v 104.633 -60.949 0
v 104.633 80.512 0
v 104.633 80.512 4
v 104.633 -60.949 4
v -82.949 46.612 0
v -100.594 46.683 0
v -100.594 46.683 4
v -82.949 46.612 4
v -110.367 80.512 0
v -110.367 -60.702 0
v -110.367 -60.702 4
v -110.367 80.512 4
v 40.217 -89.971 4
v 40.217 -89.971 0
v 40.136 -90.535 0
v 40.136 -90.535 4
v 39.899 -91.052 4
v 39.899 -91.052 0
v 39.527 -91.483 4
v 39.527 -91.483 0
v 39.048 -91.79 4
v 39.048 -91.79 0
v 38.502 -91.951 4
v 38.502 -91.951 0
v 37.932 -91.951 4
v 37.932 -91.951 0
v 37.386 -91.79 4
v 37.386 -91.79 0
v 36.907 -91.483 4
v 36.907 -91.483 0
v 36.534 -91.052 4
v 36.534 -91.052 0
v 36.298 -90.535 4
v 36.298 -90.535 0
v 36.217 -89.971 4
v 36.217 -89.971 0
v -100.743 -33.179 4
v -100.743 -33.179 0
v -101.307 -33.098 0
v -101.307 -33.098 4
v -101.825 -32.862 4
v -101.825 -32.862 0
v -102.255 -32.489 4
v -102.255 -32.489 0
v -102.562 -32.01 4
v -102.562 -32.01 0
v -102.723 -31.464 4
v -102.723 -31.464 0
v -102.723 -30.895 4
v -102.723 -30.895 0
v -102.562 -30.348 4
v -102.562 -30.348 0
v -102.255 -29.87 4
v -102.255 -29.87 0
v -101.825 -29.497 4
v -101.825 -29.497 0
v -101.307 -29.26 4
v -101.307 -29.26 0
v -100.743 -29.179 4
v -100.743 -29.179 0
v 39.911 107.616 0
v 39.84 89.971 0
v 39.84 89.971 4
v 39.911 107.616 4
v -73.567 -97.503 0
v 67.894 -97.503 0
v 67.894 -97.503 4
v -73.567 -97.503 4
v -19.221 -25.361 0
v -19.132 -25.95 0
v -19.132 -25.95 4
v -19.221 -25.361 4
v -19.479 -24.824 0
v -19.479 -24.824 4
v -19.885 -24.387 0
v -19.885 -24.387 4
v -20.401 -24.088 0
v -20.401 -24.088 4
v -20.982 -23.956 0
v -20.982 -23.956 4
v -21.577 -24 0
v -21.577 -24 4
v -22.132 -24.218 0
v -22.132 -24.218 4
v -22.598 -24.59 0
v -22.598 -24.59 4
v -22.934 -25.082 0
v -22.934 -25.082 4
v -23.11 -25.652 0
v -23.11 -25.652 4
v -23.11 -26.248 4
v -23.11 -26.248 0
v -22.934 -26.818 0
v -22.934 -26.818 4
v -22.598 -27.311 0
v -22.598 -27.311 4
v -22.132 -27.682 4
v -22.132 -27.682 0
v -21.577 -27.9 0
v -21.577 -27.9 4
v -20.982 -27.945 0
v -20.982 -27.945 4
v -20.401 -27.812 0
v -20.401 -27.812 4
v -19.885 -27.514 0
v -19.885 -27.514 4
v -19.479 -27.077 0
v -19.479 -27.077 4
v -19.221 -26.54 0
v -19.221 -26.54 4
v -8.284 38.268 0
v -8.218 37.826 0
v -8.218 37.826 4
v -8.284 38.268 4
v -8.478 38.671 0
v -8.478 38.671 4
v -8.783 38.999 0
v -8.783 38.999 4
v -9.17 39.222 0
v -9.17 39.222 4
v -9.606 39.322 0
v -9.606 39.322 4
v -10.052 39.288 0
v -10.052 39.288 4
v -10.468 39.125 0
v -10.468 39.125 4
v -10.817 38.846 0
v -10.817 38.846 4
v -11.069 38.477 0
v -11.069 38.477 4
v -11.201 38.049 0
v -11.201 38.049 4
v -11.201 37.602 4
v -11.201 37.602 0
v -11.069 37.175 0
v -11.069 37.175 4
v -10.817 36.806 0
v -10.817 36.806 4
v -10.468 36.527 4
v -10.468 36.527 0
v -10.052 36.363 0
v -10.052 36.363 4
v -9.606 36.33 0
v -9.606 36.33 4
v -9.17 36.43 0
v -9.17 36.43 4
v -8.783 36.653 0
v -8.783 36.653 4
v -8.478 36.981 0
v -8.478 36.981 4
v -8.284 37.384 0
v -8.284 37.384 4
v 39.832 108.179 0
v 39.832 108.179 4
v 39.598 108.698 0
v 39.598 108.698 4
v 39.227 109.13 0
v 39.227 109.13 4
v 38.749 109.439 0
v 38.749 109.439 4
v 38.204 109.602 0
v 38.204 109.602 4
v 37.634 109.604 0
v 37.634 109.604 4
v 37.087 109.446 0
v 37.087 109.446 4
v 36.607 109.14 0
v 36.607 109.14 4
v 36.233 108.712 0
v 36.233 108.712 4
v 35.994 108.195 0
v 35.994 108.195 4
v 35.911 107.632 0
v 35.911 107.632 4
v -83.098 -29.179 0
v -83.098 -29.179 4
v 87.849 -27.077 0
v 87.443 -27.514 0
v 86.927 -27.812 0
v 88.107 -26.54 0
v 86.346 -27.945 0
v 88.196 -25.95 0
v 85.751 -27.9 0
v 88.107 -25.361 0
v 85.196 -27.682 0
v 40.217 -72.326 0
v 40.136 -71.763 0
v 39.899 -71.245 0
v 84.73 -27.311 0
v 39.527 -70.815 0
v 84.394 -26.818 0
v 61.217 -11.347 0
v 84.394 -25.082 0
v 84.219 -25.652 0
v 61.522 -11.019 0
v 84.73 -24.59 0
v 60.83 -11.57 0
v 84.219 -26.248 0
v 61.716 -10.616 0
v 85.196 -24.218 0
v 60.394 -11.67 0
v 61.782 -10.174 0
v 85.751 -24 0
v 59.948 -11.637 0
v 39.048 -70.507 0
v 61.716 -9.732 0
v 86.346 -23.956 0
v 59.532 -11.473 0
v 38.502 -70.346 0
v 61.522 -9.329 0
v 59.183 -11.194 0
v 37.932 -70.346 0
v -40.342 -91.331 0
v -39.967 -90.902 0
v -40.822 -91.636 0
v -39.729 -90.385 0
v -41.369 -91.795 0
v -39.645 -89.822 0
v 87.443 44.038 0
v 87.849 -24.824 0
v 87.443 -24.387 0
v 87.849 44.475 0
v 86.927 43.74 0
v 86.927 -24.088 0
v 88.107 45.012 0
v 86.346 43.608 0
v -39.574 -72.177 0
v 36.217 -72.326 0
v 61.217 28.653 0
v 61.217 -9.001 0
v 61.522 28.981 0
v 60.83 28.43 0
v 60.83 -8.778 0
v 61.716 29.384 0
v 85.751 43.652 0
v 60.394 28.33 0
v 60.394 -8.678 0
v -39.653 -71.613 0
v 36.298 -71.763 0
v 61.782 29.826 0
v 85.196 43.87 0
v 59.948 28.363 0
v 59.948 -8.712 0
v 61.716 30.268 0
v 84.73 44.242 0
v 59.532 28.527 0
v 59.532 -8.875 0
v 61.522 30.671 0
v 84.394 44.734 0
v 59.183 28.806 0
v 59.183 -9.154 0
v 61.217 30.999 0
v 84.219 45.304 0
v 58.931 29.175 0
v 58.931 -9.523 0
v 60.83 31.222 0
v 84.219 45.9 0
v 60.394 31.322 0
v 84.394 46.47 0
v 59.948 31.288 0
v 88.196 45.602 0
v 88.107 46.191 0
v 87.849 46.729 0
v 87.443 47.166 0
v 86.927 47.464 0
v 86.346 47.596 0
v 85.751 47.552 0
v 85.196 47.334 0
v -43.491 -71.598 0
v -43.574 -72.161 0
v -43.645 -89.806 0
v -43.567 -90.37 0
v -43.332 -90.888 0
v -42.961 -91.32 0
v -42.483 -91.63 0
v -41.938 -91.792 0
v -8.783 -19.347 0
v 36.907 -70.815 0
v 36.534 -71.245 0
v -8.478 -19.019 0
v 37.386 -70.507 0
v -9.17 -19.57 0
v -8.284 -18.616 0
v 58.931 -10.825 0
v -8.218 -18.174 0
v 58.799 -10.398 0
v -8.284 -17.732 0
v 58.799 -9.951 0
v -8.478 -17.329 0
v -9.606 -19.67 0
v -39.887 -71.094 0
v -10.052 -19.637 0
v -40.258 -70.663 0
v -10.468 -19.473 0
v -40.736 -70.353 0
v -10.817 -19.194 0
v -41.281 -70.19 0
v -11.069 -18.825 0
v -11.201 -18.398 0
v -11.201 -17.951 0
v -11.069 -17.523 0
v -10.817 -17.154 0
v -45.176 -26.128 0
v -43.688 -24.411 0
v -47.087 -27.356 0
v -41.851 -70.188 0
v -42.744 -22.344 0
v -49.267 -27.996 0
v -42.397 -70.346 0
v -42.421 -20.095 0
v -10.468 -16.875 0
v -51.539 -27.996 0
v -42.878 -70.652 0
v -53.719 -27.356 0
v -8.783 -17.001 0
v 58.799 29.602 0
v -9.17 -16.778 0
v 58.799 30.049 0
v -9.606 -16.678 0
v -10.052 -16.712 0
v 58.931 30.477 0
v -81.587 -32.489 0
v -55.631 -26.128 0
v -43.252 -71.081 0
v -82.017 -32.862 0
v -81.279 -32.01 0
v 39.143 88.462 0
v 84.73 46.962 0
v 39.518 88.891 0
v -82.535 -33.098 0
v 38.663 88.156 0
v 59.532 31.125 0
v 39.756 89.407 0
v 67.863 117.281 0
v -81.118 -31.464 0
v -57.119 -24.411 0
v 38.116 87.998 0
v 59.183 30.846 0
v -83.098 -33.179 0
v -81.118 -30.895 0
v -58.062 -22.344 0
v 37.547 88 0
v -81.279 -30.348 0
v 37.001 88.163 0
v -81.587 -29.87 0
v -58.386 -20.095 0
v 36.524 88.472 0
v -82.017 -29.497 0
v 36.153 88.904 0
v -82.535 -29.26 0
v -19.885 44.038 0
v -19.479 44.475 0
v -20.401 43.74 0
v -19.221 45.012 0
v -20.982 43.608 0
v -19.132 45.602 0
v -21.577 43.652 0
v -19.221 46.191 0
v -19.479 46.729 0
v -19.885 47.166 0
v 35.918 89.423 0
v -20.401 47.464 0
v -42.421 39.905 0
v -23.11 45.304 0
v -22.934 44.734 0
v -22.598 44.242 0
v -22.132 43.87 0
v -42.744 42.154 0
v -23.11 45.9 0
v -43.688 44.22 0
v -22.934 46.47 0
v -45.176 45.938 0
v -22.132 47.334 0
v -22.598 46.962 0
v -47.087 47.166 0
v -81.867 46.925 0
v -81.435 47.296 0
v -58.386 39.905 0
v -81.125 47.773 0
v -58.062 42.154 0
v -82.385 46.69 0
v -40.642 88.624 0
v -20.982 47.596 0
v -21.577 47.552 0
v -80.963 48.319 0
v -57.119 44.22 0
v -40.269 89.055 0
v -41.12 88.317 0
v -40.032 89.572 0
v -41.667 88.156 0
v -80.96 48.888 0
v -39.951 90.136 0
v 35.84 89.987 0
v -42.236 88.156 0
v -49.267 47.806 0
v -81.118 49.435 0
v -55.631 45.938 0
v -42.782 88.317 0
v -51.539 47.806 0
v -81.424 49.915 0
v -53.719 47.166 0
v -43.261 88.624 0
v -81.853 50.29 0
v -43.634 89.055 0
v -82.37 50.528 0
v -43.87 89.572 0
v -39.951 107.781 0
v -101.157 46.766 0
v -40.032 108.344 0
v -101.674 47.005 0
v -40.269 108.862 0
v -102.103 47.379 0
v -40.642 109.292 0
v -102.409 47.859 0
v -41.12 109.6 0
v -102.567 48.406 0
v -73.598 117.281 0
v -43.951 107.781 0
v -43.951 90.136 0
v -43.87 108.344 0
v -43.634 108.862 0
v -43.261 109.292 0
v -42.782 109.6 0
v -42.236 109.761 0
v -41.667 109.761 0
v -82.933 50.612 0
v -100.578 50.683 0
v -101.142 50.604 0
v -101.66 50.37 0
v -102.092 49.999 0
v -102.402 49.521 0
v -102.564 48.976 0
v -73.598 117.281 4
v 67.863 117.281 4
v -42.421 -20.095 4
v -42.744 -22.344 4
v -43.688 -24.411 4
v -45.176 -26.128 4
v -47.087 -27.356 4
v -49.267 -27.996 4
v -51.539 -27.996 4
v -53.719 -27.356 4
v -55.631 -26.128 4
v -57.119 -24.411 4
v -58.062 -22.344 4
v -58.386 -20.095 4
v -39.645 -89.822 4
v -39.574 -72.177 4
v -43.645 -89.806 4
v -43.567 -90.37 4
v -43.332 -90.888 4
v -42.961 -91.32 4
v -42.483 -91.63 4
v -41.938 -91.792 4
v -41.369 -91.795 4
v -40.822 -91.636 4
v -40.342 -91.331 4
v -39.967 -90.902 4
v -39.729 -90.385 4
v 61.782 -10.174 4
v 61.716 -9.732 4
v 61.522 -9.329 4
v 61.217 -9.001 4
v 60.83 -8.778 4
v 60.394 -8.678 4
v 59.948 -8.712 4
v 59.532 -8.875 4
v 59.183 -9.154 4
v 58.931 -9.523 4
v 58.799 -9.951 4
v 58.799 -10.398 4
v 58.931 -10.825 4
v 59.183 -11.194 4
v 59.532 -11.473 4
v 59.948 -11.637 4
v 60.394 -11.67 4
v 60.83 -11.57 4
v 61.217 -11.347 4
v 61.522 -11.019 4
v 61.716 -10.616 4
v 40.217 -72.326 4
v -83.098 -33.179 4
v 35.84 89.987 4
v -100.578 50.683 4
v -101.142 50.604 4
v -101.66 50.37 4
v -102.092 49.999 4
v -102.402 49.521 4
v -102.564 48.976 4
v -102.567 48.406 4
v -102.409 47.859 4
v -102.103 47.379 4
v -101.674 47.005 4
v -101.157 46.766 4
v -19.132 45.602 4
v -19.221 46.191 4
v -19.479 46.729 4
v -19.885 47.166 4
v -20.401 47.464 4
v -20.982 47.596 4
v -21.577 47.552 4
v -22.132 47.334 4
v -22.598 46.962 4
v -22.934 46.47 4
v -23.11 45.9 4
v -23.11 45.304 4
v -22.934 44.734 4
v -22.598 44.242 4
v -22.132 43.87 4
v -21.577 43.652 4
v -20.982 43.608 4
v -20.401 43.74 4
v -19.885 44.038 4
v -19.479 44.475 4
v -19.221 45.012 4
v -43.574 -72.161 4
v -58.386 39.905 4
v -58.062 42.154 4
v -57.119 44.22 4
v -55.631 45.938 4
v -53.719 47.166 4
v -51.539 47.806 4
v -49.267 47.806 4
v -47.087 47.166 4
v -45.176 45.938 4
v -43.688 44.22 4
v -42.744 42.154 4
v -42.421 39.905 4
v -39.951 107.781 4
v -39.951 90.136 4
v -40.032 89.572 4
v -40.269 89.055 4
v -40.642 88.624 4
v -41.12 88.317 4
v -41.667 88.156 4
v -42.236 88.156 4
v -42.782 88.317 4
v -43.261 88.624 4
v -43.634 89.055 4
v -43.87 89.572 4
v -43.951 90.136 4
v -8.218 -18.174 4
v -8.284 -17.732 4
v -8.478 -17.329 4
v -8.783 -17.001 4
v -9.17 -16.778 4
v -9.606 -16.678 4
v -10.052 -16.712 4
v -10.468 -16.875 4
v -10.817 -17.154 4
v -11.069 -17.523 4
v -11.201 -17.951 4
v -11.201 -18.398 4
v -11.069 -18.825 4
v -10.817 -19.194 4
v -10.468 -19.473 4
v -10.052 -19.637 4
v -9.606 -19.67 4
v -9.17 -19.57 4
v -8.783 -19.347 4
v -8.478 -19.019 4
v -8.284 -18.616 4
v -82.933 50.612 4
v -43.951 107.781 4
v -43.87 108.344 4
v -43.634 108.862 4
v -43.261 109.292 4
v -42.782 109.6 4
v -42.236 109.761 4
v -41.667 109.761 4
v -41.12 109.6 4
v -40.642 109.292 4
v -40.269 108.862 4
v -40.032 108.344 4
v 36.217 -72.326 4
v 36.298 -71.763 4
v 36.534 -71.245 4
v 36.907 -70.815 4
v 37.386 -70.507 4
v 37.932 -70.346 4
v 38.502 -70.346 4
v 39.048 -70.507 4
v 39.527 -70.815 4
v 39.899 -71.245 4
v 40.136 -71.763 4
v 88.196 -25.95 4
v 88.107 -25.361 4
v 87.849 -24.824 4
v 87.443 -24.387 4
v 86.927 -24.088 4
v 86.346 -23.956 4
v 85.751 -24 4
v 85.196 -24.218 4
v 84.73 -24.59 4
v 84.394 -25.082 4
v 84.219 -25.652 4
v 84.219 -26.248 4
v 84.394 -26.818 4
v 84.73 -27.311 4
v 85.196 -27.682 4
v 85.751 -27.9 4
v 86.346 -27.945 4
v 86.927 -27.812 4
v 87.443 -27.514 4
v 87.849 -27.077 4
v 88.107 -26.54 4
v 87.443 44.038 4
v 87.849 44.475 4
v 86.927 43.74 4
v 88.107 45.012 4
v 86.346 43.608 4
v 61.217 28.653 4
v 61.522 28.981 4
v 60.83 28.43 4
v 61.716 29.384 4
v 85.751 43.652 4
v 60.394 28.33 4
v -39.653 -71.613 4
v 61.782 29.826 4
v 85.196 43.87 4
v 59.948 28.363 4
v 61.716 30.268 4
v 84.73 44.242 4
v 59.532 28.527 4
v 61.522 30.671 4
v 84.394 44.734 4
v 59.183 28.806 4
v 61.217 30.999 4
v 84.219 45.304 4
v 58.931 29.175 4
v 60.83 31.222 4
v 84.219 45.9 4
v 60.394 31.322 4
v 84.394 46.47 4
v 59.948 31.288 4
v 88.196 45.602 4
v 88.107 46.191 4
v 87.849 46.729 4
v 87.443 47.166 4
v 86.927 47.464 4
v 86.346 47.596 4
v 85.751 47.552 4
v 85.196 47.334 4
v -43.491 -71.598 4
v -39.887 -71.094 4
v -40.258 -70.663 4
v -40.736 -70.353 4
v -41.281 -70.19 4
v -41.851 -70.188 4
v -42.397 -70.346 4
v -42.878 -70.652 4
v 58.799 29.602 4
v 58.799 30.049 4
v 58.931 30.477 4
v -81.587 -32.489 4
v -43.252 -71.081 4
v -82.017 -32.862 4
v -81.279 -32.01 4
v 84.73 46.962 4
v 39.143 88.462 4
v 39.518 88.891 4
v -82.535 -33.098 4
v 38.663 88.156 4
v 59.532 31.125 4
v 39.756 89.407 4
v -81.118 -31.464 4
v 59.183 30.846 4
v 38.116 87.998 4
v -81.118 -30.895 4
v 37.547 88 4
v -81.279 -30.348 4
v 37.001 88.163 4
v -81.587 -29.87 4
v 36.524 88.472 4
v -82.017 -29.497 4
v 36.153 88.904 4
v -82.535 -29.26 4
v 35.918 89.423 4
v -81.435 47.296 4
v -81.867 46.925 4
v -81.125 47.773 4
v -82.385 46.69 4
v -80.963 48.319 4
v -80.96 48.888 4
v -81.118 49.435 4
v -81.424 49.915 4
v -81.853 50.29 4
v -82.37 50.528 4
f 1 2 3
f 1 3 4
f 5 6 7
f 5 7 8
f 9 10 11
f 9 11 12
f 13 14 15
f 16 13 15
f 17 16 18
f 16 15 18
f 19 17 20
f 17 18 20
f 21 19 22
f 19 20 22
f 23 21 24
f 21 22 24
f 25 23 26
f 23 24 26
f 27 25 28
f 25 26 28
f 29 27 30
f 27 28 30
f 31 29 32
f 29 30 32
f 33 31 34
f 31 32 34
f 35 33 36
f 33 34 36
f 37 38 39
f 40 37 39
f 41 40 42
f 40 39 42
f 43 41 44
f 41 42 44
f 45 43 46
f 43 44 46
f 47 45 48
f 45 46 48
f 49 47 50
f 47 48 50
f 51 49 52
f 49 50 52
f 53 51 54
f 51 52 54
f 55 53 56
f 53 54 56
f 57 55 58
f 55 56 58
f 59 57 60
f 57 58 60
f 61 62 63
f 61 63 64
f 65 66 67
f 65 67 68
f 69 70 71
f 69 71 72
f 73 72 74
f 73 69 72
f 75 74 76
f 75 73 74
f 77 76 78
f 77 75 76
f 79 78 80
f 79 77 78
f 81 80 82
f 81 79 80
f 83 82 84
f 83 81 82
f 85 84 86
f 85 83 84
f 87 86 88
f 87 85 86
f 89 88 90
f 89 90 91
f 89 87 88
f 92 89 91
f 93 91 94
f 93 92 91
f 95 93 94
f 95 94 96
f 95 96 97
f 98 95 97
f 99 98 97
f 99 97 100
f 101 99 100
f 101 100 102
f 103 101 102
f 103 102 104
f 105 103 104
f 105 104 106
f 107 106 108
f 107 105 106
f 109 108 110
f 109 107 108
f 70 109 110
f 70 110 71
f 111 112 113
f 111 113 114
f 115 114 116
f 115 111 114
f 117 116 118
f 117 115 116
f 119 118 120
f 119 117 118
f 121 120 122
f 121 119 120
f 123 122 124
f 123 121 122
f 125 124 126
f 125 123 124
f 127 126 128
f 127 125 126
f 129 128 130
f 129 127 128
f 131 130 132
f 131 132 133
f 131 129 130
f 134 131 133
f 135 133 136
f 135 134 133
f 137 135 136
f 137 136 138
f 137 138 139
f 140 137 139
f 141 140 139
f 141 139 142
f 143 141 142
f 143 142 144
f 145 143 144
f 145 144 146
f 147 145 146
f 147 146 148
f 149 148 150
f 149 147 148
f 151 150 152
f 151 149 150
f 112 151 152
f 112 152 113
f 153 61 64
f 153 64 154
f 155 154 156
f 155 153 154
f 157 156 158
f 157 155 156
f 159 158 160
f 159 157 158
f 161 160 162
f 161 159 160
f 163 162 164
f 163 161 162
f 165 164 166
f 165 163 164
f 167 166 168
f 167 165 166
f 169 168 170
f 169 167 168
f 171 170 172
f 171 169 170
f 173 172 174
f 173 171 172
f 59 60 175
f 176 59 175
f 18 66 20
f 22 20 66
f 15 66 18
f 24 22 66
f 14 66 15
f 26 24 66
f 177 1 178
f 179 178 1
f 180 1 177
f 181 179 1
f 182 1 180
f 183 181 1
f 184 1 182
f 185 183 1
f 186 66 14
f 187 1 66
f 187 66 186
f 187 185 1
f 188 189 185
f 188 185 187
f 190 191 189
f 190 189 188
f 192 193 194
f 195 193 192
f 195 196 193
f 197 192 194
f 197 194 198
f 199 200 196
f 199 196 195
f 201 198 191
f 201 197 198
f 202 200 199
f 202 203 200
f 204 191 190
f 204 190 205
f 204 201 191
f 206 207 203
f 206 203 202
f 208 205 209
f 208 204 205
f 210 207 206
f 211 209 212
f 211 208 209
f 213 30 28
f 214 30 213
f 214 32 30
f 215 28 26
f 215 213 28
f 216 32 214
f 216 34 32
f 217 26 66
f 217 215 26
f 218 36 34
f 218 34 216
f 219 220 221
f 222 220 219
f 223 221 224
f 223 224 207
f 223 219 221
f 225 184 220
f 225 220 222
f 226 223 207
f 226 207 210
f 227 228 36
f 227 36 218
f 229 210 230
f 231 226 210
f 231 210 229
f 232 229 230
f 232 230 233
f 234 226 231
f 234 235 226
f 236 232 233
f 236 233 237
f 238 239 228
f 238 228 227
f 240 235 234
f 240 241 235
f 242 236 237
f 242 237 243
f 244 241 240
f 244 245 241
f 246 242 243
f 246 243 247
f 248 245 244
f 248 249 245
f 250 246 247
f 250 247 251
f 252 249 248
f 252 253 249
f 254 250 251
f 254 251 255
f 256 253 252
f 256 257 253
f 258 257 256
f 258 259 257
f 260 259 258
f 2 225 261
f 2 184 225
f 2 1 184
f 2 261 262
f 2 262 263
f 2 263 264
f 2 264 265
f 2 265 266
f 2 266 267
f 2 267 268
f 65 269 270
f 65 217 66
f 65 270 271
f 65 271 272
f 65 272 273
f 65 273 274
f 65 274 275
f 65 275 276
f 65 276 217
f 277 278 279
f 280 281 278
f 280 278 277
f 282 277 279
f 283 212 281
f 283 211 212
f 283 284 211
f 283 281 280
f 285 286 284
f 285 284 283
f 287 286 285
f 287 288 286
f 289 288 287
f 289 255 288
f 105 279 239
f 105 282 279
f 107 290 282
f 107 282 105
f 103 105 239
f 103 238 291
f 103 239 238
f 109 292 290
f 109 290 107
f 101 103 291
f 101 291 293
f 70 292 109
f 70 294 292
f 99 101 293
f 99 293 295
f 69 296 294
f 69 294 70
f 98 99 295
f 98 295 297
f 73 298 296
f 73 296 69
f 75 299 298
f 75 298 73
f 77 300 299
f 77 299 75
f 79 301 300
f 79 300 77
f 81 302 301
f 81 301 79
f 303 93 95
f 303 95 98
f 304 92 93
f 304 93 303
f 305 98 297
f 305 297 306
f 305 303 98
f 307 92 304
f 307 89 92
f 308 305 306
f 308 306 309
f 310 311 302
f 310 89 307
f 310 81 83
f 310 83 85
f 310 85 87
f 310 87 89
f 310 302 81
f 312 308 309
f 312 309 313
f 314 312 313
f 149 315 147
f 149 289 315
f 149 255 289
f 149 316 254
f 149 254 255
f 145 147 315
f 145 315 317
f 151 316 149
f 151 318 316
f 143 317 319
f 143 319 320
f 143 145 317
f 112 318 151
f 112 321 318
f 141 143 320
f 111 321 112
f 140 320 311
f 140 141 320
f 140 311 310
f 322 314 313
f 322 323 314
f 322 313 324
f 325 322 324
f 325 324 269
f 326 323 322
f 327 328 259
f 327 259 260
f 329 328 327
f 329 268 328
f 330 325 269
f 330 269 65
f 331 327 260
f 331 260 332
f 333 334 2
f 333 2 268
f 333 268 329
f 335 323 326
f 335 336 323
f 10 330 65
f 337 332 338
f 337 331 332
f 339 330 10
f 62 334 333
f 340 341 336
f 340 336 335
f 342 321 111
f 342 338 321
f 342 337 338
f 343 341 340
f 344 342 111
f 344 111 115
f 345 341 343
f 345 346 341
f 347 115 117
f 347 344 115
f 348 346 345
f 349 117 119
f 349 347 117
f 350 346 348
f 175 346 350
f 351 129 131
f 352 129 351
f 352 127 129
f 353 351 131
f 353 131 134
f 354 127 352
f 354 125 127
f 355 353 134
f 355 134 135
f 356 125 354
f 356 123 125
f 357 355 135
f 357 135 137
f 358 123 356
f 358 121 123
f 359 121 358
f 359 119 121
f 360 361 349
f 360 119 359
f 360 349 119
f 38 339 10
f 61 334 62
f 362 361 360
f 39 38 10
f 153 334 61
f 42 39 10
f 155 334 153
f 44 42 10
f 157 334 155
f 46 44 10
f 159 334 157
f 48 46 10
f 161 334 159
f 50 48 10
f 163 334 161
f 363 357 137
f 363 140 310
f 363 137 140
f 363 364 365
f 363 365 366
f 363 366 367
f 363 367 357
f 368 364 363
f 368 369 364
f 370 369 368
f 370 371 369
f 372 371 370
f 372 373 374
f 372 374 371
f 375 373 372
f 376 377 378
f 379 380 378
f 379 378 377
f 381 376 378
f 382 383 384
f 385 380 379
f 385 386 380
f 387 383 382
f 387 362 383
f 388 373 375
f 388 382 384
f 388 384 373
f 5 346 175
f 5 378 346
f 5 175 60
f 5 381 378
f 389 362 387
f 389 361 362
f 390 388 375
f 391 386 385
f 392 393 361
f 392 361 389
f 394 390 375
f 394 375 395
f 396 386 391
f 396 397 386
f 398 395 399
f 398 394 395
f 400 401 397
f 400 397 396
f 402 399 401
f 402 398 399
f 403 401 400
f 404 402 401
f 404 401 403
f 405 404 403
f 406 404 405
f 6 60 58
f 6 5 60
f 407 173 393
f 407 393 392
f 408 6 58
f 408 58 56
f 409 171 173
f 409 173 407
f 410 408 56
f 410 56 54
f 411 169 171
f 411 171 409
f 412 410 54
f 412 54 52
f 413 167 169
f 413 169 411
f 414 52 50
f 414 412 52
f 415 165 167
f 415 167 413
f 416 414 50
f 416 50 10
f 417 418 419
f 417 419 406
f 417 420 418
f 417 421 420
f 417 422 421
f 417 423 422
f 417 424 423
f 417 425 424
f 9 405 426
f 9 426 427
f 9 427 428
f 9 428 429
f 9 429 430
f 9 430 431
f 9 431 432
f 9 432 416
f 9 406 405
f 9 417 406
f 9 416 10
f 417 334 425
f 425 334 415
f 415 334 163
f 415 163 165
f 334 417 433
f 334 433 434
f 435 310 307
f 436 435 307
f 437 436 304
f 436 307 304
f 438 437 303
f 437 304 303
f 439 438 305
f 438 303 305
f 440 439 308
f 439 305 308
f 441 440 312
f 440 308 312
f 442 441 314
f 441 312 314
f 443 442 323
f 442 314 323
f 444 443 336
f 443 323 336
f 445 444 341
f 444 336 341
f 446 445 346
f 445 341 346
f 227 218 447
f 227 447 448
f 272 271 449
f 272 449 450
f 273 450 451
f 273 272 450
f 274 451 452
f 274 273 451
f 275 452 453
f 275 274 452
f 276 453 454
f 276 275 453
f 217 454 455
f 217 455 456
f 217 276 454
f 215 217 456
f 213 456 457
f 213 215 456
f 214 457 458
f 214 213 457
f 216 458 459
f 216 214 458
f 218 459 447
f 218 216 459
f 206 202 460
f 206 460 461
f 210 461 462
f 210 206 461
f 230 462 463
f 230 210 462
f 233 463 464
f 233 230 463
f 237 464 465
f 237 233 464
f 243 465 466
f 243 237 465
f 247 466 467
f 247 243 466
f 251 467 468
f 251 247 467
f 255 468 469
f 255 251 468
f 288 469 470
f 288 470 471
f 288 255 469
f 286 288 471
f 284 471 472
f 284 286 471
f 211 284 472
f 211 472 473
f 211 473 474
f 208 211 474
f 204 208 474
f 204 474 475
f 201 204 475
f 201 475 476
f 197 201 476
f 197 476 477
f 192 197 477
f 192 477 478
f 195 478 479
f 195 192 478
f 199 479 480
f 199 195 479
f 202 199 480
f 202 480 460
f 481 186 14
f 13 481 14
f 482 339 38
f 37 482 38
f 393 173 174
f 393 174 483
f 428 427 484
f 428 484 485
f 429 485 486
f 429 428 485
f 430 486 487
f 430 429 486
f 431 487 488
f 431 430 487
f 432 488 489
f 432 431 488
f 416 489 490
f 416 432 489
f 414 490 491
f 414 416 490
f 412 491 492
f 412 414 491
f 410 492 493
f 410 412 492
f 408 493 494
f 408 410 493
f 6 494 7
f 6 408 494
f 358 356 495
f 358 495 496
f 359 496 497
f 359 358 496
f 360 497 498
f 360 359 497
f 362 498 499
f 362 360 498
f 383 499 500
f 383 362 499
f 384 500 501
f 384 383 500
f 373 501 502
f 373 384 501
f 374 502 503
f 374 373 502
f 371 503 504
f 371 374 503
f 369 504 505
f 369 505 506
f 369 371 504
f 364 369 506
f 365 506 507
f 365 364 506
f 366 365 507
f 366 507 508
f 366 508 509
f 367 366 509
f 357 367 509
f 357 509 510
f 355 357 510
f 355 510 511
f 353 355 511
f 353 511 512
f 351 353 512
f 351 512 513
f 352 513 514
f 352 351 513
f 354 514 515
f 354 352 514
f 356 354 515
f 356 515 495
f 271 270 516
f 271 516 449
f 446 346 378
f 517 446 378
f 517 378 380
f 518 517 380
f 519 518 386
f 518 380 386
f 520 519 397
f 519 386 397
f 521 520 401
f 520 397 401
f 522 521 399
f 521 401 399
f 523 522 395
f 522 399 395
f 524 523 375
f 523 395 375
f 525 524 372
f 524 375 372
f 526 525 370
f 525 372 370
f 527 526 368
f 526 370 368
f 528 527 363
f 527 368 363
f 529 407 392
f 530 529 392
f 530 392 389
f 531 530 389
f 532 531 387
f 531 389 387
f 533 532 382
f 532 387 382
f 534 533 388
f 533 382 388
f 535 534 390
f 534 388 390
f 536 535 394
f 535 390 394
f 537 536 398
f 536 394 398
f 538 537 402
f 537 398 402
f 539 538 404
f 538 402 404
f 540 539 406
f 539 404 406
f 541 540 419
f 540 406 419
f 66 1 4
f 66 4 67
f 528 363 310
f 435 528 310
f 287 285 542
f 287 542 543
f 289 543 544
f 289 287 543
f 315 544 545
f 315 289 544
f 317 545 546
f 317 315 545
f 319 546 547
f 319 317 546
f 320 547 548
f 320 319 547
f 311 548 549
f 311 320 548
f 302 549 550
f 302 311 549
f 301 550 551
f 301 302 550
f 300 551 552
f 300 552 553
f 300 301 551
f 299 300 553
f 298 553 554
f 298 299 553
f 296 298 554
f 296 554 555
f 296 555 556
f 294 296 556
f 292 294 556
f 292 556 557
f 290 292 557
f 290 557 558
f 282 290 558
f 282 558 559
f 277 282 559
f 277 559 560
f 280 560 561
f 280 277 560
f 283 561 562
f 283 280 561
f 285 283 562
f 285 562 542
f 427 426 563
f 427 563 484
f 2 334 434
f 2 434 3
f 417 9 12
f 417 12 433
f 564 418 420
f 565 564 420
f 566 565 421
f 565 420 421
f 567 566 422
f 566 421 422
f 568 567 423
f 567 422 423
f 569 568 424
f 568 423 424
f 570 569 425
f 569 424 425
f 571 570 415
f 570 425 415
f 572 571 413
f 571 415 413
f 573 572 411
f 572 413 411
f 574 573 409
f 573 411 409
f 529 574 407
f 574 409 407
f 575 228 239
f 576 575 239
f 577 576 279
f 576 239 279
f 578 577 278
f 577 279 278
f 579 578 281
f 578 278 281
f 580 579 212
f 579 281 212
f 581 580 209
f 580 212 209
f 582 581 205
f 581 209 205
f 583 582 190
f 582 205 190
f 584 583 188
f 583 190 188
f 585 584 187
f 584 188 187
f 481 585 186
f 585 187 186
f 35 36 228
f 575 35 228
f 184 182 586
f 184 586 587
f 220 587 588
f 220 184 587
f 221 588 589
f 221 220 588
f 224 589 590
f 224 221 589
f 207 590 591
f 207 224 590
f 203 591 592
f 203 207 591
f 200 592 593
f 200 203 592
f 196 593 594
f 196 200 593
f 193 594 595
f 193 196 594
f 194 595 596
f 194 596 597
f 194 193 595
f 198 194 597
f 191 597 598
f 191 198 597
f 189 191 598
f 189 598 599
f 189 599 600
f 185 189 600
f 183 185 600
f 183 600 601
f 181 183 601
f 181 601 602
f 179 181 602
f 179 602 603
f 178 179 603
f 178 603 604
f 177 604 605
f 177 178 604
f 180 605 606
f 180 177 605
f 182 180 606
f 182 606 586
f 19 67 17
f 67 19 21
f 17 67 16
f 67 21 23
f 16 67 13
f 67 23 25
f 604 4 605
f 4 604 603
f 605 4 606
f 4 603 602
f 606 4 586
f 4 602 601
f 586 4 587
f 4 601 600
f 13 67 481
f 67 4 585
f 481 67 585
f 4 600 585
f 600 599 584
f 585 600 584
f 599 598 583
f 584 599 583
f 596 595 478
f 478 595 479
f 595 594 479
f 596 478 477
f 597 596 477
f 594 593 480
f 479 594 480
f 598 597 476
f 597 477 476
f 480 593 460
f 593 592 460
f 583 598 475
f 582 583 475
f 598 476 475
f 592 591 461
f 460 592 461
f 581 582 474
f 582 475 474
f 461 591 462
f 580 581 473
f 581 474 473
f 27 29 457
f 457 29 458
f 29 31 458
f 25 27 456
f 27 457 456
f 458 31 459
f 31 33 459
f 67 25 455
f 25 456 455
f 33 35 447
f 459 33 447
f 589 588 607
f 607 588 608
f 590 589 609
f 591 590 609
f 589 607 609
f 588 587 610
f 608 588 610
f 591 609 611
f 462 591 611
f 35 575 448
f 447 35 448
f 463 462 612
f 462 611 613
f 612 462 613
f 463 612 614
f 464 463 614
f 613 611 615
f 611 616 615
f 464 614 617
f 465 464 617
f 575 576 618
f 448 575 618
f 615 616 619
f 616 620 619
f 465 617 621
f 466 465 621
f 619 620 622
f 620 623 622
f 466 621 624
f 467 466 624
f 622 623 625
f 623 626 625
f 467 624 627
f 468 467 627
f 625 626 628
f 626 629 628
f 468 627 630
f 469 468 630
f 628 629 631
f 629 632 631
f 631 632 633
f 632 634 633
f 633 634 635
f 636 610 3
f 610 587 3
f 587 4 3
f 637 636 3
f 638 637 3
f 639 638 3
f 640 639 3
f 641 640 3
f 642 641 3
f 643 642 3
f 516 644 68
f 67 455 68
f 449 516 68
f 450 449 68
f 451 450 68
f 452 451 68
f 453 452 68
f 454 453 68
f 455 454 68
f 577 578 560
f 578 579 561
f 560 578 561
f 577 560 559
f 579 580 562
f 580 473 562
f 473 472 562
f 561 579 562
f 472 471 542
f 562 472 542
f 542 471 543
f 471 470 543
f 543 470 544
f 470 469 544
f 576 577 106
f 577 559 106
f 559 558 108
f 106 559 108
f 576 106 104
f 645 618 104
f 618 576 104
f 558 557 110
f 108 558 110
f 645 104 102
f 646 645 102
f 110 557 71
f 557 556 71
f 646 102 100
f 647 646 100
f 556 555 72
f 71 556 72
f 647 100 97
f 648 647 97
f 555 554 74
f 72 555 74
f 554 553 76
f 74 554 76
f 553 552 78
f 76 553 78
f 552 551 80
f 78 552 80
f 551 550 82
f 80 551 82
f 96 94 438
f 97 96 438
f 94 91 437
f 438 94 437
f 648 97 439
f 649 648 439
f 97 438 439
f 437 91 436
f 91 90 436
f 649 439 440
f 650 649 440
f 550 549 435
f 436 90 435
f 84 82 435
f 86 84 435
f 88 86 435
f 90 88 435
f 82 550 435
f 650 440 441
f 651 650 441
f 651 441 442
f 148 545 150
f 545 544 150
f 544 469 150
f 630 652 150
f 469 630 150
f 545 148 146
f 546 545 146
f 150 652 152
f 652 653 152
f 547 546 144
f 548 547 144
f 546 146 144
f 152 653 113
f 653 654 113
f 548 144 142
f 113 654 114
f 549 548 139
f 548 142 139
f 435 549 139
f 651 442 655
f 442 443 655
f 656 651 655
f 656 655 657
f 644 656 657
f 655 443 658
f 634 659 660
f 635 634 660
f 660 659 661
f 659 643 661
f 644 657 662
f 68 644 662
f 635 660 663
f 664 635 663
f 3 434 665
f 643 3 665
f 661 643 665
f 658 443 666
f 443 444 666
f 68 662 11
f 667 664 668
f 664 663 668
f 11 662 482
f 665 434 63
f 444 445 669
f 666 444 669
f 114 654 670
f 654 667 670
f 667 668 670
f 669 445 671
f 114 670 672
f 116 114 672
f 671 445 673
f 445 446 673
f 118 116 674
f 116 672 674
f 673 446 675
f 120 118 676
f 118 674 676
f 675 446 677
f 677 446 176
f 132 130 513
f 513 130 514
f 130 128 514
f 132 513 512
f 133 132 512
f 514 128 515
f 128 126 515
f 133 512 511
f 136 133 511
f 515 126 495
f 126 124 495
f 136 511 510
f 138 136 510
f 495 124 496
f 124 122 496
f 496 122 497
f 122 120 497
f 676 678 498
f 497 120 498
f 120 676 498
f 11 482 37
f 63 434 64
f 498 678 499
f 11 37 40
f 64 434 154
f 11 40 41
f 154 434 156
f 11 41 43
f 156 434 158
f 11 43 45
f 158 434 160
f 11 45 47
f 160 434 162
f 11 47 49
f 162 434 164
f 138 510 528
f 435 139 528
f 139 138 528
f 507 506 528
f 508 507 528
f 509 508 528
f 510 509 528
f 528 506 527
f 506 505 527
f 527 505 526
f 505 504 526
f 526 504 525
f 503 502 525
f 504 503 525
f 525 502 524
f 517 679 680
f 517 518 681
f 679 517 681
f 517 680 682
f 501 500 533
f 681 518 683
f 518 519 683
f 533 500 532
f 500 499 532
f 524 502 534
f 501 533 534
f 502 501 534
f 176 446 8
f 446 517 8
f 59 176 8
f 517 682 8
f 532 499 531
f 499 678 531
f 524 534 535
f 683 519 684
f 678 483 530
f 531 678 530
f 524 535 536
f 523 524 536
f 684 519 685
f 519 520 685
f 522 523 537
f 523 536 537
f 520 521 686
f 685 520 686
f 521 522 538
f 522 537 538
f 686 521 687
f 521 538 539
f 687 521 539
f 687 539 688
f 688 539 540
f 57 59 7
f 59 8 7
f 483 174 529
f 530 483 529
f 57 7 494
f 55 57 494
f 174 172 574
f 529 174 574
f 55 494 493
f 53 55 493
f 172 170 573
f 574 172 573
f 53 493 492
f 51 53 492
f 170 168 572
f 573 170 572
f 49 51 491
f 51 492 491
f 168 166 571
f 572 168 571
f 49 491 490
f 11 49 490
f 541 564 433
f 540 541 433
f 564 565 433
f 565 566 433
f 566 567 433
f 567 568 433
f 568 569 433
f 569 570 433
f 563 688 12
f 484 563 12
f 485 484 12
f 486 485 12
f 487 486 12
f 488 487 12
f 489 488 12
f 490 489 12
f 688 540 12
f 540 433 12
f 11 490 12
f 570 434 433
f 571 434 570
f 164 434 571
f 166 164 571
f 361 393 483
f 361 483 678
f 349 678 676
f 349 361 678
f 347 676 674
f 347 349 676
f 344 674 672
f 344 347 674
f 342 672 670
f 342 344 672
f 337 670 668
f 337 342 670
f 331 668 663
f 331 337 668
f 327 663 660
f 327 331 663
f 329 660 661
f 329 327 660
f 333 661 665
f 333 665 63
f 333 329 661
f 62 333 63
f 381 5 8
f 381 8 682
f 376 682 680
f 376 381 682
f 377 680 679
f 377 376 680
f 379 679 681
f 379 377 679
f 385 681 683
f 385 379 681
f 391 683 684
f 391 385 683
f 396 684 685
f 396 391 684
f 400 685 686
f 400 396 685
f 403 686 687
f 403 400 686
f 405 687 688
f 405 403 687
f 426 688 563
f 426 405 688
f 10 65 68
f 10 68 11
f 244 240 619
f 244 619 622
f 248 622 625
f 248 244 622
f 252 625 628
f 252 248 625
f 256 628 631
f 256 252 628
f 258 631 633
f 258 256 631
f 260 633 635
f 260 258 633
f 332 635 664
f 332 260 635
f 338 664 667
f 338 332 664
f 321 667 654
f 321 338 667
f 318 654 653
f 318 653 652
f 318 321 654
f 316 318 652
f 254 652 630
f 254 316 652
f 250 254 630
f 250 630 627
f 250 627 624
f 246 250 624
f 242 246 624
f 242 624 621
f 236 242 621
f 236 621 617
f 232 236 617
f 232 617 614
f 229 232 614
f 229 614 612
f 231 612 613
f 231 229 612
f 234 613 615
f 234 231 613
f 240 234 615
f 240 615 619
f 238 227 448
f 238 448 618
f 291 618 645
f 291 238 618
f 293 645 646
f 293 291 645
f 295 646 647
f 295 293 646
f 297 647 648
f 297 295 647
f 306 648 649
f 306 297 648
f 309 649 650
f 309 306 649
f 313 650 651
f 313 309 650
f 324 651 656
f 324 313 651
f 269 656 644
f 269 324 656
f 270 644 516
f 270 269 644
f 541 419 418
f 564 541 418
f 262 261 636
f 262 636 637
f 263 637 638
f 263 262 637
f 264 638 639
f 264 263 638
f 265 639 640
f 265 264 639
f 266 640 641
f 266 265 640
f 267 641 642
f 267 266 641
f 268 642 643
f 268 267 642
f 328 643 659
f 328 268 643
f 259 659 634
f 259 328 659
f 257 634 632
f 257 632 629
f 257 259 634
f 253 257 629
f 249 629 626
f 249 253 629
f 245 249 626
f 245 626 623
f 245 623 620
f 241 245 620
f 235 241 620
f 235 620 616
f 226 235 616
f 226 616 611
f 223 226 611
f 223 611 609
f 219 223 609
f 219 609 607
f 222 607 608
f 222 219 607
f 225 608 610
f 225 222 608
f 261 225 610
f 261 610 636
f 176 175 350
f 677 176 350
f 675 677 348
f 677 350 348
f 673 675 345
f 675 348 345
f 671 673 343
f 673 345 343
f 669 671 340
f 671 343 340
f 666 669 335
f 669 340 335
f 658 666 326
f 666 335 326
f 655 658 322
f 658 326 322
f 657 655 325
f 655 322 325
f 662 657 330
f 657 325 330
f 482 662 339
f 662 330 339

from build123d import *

# Parameters (mm, degrees)
SKETCH1_R           = 1.5
SKETCH1_R_2         = 2
BOSS_EXTRUDE2_DEPTH = 4


with BuildPart() as part:
    # Sketch1 → Boss-Extrude2 (new body)
    with BuildSketch(Plane.XY):
        Polygon((-73.597643579, 117.281365478), (67.863251178, 117.281365478), (104.632803799, 80.511812856), (104.632803799, -60.949081901), (67.894125273, -97.50252168), (-73.566769484, -97.50252168), (-110.367196201, -60.702096755), (-110.367196201, 80.511812856), align=None)
        with Locations((-9.717773474, 37.825883079)):
            Circle(SKETCH1_R, mode=Mode.SUBTRACT)
        with Locations((60.282226526, 29.825883079)):
            Circle(SKETCH1_R, mode=Mode.SUBTRACT)
        with Locations((60.282226526, -10.174116921)):
            Circle(SKETCH1_R, mode=Mode.SUBTRACT)
        with Locations((-9.717773474, -18.174116921)):
            Circle(SKETCH1_R, mode=Mode.SUBTRACT)
        with Locations((-21.13184974, 45.601933923)):
            Circle(SKETCH1_R_2, mode=Mode.SUBTRACT)
        with Locations((86.196302793, 45.601933923)):
            Circle(SKETCH1_R_2, mode=Mode.SUBTRACT)
        with Locations((86.196302793, -25.950167766)):
            Circle(SKETCH1_R_2, mode=Mode.SUBTRACT)
        with Locations((-21.13184974, -25.950167766)):
            Circle(SKETCH1_R_2, mode=Mode.SUBTRACT)
        with BuildLine():
            Line((-58.385806079, -20.095141949), (-58.385806079, 39.904858051))
            ThreePointArc((-58.385806079, 39.904858051), (-50.403357017, 47.887307113), (-42.420907955, 39.904858051))
            Line((-42.420907955, 39.904858051), (-42.420907955, -20.095141949))
            ThreePointArc((-42.420907955, -20.095141949), (-50.403357017, -28.077591011), (-58.385806079, -20.095141949))
        make_face(mode=Mode.SUBTRACT)
        with BuildLine():
            Line((-43.951300834, 90.135788358), (-43.951300834, 107.780882998))
            ThreePointArc((-43.951300834, 107.780882998), (-41.951300834, 109.780882998), (-39.951300834, 107.780882998))
            Line((-39.951300834, 107.780882998), (-39.951300834, 90.135788358))
            ThreePointArc((-39.951300834, 90.135788358), (-41.951300834, 88.135788358), (-43.951300834, 90.135788358))
        make_face(mode=Mode.SUBTRACT)
        with BuildLine():
            Line((39.83957888, 89.970561723), (39.910868679, 107.61551235))
            ThreePointArc((39.910868679, 107.61551235), (37.918965413, 109.623576437), (35.910901326, 107.63167317))
            Line((35.910901326, 107.63167317), (35.839611526, 89.986722543))
            ThreePointArc((35.839611526, 89.986722543), (37.831514793, 87.978658457), (39.83957888, 89.970561723))
        make_face(mode=Mode.SUBTRACT)
        with BuildLine():
            Line((-83.098126059, -33.179247031), (-100.743220699, -33.179247031))
            ThreePointArc((-100.743220699, -33.179247031), (-102.743220699, -31.179247031), (-100.743220699, -29.179247031))
            Line((-100.743220699, -29.179247031), (-83.098126059, -29.179247031))
            ThreePointArc((-83.098126059, -29.179247031), (-81.098126059, -31.179247031), (-83.098126059, -33.179247031))
        make_face(mode=Mode.SUBTRACT)
        with BuildLine():
            Line((-82.932899424, 50.611632682), (-100.577850051, 50.682922481))
            ThreePointArc((-100.577850051, 50.682922481), (-102.585914138, 48.691019215), (-100.594010871, 46.682955128))
            Line((-100.594010871, 46.682955128), (-82.949060244, 46.611665329))
            ThreePointArc((-82.949060244, 46.611665329), (-80.940996157, 48.603568595), (-82.932899424, 50.611632682))
        make_face(mode=Mode.SUBTRACT)
        with BuildLine():
            Line((40.21690933, -72.326072256), (40.21690933, -89.971166897))
            ThreePointArc((40.21690933, -89.971166897), (38.21690933, -91.971166897), (36.21690933, -89.971166897))
            Line((36.21690933, -89.971166897), (36.21690933, -72.326072256))
            ThreePointArc((36.21690933, -72.326072256), (38.21690933, -70.326072256), (40.21690933, -72.326072256))
        make_face(mode=Mode.SUBTRACT)
        with BuildLine():
            Line((-43.573970383, -72.160845622), (-43.645260182, -89.805796249))
            ThreePointArc((-43.645260182, -89.805796249), (-41.653356916, -91.813860335), (-39.645292829, -89.821957069))
            Line((-39.645292829, -89.821957069), (-39.574003029, -72.177006442))
            ThreePointArc((-39.574003029, -72.177006442), (-41.565906296, -70.168942355), (-43.573970383, -72.160845622))
        make_face(mode=Mode.SUBTRACT)
    extrude(amount=BOSS_EXTRUDE2_DEPTH)


solid = part.part
